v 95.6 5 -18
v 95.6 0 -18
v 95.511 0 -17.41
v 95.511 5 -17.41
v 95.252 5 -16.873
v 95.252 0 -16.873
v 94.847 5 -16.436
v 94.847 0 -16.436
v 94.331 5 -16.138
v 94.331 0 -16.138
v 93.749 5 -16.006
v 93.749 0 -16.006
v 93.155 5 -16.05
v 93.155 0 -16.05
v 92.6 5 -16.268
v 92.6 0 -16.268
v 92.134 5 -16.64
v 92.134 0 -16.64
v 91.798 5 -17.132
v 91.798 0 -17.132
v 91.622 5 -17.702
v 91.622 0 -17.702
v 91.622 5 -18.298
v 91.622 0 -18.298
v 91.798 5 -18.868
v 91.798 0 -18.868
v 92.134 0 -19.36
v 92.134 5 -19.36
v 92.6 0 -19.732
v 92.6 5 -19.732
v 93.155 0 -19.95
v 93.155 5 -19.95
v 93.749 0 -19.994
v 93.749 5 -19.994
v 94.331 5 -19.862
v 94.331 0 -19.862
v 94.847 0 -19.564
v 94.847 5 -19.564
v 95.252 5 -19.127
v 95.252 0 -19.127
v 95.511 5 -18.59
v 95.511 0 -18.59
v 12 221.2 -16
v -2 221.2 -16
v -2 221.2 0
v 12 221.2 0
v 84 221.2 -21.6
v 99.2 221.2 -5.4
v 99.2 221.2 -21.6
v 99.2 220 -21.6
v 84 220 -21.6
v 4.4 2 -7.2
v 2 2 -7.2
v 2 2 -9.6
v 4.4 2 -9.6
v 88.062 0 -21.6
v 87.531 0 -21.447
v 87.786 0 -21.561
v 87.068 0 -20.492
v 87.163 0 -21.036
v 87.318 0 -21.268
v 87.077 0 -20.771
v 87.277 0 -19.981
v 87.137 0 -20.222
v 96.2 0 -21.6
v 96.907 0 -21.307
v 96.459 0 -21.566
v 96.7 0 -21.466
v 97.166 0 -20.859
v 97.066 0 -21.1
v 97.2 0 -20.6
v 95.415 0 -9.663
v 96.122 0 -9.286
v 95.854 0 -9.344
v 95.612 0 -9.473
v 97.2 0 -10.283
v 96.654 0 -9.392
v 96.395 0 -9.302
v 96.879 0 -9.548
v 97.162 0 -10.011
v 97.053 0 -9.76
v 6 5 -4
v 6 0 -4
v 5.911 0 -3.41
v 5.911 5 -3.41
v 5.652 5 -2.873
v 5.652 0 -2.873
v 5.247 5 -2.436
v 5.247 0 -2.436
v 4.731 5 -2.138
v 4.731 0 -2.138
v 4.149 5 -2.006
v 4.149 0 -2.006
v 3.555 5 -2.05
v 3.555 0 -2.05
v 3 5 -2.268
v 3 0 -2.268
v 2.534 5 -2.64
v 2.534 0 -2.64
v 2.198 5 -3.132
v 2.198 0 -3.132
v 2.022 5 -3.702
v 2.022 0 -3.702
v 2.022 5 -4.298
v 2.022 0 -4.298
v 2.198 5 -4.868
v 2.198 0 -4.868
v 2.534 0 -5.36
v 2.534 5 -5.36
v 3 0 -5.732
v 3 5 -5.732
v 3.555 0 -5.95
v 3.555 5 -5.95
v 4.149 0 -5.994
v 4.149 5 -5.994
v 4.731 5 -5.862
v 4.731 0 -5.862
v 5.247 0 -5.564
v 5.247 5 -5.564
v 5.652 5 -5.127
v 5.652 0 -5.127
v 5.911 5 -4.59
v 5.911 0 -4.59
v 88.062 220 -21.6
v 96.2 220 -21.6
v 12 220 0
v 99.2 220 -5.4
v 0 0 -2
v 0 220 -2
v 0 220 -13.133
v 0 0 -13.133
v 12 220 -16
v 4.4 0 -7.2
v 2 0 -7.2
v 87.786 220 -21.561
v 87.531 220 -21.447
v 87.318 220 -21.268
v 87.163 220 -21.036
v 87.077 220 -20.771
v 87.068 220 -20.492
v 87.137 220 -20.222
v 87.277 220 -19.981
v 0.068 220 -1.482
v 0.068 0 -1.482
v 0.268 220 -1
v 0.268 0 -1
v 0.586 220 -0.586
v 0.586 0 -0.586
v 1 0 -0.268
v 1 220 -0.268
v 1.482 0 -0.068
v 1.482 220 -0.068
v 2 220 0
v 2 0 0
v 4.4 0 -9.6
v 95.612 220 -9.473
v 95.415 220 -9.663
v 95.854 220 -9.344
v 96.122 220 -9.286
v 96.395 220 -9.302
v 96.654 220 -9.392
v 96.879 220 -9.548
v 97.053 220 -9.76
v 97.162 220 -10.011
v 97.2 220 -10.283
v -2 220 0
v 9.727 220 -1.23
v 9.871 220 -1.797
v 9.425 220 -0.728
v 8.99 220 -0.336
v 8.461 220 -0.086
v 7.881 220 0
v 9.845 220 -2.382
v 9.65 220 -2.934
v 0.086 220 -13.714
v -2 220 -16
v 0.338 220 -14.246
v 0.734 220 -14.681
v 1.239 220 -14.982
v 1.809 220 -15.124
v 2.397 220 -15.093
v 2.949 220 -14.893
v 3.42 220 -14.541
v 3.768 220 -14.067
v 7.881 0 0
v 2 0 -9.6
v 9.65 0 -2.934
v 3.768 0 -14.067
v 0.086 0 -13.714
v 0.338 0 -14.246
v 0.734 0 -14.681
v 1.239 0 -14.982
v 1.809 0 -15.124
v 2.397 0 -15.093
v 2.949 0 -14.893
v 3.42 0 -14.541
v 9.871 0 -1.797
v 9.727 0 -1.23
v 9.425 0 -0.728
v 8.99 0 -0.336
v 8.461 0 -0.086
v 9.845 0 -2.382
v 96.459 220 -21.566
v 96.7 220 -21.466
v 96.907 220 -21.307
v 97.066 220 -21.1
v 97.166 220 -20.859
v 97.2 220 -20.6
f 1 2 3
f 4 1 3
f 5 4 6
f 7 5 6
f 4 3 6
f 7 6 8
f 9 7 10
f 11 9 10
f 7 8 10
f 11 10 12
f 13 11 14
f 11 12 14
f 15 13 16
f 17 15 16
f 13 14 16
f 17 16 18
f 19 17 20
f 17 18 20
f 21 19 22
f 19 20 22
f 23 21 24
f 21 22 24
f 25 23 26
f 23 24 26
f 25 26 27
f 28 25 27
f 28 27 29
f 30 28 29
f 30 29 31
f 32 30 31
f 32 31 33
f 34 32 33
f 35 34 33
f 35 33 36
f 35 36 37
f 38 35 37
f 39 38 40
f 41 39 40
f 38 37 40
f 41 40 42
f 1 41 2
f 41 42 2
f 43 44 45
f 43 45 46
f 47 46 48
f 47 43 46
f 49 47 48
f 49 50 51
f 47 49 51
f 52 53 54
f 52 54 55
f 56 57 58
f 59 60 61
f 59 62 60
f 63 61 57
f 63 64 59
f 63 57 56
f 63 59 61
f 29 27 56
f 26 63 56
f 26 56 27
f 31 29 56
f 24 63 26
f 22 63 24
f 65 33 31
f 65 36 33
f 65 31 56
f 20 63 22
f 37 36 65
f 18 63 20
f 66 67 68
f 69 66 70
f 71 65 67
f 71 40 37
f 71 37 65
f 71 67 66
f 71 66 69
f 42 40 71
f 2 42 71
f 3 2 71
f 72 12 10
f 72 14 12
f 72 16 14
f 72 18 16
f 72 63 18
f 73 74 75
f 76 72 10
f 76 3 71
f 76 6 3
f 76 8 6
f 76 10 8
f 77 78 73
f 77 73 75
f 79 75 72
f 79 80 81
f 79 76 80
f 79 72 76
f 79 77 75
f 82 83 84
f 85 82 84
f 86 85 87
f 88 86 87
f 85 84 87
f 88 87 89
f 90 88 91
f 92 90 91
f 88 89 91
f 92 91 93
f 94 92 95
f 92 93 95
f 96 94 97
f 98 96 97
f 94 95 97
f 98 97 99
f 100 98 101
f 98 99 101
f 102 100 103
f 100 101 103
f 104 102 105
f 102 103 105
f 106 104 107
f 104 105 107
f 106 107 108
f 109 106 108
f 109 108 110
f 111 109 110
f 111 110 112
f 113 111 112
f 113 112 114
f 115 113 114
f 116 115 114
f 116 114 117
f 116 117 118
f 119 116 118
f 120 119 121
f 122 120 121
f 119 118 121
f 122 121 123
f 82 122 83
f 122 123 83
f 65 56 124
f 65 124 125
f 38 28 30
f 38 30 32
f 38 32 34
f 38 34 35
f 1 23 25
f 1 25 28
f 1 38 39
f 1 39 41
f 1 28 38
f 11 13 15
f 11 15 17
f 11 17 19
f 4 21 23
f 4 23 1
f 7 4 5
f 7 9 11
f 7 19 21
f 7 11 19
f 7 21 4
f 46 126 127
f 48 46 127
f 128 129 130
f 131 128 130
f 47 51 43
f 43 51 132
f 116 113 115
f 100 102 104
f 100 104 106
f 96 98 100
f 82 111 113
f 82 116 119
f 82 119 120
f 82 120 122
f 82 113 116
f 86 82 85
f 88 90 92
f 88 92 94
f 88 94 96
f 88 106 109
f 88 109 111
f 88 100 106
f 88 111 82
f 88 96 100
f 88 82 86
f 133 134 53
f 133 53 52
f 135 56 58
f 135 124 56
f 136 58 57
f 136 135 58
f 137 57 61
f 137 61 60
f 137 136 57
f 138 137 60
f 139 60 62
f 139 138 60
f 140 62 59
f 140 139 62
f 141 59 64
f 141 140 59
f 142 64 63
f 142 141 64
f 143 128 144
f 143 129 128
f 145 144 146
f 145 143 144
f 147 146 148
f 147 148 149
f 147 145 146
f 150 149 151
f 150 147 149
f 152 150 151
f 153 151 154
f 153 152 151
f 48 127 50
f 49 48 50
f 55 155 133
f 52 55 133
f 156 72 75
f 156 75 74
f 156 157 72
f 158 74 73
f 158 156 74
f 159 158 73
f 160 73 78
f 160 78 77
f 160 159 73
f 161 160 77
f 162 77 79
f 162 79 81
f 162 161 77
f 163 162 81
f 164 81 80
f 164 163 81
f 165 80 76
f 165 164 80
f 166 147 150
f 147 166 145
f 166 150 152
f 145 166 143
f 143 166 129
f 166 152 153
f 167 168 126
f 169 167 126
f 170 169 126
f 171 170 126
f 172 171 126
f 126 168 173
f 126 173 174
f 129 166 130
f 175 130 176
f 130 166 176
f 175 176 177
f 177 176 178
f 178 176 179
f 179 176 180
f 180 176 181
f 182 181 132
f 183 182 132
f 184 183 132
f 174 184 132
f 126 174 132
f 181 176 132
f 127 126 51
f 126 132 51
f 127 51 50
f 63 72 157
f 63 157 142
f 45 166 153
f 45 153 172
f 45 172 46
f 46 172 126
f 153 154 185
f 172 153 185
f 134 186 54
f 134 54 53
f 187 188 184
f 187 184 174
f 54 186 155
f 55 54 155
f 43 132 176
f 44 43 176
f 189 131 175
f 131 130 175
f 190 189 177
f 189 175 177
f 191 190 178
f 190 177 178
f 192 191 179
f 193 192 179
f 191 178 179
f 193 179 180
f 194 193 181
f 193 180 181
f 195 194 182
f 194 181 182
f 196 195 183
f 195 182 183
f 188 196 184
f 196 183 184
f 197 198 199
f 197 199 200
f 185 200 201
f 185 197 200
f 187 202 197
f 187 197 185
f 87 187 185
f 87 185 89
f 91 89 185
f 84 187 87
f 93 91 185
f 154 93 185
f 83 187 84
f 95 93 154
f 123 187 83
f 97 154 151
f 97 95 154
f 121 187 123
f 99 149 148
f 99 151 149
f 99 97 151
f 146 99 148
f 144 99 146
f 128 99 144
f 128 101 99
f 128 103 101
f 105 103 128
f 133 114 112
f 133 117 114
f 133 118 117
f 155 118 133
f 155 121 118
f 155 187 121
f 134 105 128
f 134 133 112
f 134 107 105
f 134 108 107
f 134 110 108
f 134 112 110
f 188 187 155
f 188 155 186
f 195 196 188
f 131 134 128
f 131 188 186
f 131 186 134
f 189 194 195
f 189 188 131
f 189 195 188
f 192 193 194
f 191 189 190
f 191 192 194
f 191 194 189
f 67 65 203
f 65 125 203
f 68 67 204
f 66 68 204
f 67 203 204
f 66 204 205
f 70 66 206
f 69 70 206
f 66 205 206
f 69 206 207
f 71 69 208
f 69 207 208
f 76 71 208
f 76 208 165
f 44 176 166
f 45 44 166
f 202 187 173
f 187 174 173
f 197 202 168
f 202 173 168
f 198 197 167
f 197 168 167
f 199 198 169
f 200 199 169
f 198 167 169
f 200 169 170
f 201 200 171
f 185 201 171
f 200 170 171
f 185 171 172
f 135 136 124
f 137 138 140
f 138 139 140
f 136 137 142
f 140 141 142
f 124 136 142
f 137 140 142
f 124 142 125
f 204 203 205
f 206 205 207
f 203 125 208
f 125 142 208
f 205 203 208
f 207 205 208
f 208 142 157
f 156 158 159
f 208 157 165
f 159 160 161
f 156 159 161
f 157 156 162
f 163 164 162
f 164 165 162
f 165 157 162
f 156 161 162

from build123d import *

# Parameters (mm, degrees)
BOSS_EXTRUDE1_DEPTH = 220
FILLET1_R           = 2
BOSS_EXTRUDE5_DEPTH = 220
SKETCH3_R           = 2
CUT_EXTRUDE1_DEPTH  = 5
SKETCH4_W           = 2.4
SKETCH4_H           = 2.4
CUT_EXTRUDE2_DEPTH  = 2
BOSS_EXTRUDE4_DEPTH = 1.2
FILLET2_R           = 1


with BuildPart() as part:
    # Sketch1 → Boss-Extrude1 (new body)
    with BuildSketch(Plane(origin=(0, 0, 0), x_dir=(1, 0, 0), z_dir=(0, 1, 0))):
        Polygon((0, 0), (0, 21.2), (11.2, 0), align=None)
    extrude(amount=BOSS_EXTRUDE1_DEPTH)

    # Fillet1
    fillet1_edges = [part.edges().sort_by_distance(p)[0] for p in [
        (0, 110, 0),
        (0, 110, -21.2),
        (11.2, 110, 0),
    ]]
    fillet(fillet1_edges, radius=FILLET1_R)


with BuildPart() as body_2:
    # Sketch5 → Boss-Extrude5 (new body)
    with BuildSketch(Plane.XZ):
        Polygon((86, -21.6), (97.2, -21.6), (97.2, -7.4), align=None)
    extrude(amount=-BOSS_EXTRUDE5_DEPTH)


with BuildPart() as cut_extrude1_tool:
    # Sketch3 → Cut-Extrude1 (new body)
    with BuildSketch(Plane.XZ):
        with Locations((4, -4)):
            Circle(SKETCH3_R)
        with Locations((93.6, -18)):
            Circle(SKETCH3_R)
    extrude(amount=-CUT_EXTRUDE1_DEPTH)


with BuildPart() as part_1:
    add(part.part)

    # Cut-Extrude1: cut by cut_extrude1_tool
    add(cut_extrude1_tool.part, mode=Mode.SUBTRACT)

    # Sketch4 → Cut-Extrude2 (cut)
    with BuildSketch(Plane.XZ):
        with Locations((3.2, -8.4)):
            Rectangle(SKETCH4_W, SKETCH4_H)
    extrude(amount=-CUT_EXTRUDE2_DEPTH, mode=Mode.SUBTRACT)

    # Sketch6 → Boss-Extrude4 (add)
    with BuildSketch(Plane(origin=(0, 220, 0), x_dir=(1, 0, 0), z_dir=(0, 1, 0))):
        Polygon((99.2, 21.6), (84, 21.6), (12, 16), (-2, 16), (-2, 0), (12, 0), (99.2, 5.4), align=None)
    extrude(amount=BOSS_EXTRUDE4_DEPTH)


with BuildPart() as body_2_1:
    add(body_2.part)

    # Cut-Extrude1: cut by cut_extrude1_tool
    add(cut_extrude1_tool.part, mode=Mode.SUBTRACT)

    # Fillet2
    fillet2_edges = [body_2_1.edges().sort_by_distance(p)[0] for p in [
        (97.2, 110, -7.4),
        (86, 110, -21.6),
        (97.2, 110, -21.6),
    ]]
    fillet(fillet2_edges, radius=FILLET2_R)


solid = Compound([part_1.part, body_2_1.part])
